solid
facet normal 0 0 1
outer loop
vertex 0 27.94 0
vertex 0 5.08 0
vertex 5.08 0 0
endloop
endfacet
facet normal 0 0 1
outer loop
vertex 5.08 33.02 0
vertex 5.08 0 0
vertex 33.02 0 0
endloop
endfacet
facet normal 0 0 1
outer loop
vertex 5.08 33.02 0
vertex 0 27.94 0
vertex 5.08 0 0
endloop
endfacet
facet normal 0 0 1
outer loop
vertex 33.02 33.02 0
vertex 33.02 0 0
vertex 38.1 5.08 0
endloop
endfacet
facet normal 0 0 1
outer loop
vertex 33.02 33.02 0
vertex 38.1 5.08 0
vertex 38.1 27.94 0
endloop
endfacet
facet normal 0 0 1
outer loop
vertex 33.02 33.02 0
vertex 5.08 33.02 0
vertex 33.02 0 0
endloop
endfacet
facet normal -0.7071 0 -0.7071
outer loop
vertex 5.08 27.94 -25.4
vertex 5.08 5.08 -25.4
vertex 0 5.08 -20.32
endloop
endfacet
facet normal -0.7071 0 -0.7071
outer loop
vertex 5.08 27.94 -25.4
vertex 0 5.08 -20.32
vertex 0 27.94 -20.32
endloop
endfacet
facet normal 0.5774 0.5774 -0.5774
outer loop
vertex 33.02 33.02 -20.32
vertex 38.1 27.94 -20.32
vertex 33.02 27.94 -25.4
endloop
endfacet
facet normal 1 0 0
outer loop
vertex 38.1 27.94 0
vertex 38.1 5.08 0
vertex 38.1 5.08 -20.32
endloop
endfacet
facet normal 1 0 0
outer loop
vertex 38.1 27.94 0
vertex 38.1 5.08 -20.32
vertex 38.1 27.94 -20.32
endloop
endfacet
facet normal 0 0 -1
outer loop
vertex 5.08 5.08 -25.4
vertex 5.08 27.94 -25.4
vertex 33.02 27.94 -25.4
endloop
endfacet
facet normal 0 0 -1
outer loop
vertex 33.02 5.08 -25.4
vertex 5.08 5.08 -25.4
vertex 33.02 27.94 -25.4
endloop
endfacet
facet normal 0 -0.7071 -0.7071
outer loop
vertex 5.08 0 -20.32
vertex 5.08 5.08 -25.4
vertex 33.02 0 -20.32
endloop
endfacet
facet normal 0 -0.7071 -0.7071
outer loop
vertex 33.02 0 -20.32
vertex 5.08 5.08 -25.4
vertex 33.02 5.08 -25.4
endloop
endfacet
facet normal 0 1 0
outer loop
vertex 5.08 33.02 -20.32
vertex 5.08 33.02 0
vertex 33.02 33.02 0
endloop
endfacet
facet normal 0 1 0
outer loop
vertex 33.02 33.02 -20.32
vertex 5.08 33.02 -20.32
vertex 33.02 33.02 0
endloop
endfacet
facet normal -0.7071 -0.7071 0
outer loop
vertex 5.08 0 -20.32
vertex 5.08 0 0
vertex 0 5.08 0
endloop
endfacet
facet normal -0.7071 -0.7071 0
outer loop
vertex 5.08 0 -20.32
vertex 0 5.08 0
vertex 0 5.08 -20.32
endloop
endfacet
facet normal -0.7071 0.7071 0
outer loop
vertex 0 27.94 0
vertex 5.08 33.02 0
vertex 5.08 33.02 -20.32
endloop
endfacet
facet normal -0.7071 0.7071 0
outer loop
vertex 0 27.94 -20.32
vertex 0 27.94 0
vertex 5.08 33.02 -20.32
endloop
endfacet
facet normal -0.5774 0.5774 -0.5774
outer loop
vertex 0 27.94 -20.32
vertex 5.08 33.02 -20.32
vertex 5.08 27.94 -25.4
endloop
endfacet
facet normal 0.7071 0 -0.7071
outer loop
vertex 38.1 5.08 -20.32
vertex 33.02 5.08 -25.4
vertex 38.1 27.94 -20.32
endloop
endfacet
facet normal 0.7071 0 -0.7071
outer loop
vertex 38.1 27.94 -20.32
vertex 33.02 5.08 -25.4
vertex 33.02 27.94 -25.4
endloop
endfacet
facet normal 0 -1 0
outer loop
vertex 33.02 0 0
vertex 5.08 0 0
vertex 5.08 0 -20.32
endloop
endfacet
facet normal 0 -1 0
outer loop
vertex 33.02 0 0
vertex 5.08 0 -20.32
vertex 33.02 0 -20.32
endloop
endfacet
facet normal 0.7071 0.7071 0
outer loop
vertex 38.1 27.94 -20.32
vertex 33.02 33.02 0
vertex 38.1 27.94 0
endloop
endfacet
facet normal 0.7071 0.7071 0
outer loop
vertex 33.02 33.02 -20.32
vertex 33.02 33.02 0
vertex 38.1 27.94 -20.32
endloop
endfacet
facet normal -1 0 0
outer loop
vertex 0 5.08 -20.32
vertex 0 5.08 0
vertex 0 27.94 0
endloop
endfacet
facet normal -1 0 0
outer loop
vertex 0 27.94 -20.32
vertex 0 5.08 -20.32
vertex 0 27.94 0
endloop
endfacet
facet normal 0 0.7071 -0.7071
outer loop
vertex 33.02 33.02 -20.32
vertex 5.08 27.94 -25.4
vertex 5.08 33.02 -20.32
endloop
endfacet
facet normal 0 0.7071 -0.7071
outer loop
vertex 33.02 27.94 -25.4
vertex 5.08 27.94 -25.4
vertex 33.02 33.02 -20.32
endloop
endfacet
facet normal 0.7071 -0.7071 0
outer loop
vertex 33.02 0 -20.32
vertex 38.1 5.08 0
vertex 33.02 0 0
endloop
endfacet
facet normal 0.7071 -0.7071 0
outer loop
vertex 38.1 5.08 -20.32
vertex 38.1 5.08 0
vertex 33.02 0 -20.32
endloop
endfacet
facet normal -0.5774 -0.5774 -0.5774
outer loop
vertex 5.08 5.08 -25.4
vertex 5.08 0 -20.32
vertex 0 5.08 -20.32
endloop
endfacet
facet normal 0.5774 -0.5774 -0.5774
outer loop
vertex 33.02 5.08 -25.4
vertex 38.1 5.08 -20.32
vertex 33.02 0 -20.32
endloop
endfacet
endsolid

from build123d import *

# Parameters (mm, degrees)
F0_W     = 38.1
F0_H     = 33.02
F1_DEPTH = 25.4
F2_SIZE  = 5.08


with BuildPart() as f1:
    # F0 (on Top) → F1 (new body)
    with BuildSketch(Plane.XY):
        with Locations((19.05, 16.51)):
            Rectangle(F0_W, F0_H)
    extrude(amount=-F1_DEPTH)

    # F2
    f2_edges = [f1.edges().sort_by_distance(p)[0] for p in [
        (38.1, 0, -12.7),
        (38.1, 33.02, -12.7),
        (38.1, 16.51, -25.4),
        (19.05, 0, -25.4),
        (0, 0, -12.7),
        (19.05, 33.02, -25.4),
        (0, 33.02, -12.7),
        (0, 16.51, -25.4),
    ]]
    chamfer(f2_edges, length=F2_SIZE)


solid = f1.part
